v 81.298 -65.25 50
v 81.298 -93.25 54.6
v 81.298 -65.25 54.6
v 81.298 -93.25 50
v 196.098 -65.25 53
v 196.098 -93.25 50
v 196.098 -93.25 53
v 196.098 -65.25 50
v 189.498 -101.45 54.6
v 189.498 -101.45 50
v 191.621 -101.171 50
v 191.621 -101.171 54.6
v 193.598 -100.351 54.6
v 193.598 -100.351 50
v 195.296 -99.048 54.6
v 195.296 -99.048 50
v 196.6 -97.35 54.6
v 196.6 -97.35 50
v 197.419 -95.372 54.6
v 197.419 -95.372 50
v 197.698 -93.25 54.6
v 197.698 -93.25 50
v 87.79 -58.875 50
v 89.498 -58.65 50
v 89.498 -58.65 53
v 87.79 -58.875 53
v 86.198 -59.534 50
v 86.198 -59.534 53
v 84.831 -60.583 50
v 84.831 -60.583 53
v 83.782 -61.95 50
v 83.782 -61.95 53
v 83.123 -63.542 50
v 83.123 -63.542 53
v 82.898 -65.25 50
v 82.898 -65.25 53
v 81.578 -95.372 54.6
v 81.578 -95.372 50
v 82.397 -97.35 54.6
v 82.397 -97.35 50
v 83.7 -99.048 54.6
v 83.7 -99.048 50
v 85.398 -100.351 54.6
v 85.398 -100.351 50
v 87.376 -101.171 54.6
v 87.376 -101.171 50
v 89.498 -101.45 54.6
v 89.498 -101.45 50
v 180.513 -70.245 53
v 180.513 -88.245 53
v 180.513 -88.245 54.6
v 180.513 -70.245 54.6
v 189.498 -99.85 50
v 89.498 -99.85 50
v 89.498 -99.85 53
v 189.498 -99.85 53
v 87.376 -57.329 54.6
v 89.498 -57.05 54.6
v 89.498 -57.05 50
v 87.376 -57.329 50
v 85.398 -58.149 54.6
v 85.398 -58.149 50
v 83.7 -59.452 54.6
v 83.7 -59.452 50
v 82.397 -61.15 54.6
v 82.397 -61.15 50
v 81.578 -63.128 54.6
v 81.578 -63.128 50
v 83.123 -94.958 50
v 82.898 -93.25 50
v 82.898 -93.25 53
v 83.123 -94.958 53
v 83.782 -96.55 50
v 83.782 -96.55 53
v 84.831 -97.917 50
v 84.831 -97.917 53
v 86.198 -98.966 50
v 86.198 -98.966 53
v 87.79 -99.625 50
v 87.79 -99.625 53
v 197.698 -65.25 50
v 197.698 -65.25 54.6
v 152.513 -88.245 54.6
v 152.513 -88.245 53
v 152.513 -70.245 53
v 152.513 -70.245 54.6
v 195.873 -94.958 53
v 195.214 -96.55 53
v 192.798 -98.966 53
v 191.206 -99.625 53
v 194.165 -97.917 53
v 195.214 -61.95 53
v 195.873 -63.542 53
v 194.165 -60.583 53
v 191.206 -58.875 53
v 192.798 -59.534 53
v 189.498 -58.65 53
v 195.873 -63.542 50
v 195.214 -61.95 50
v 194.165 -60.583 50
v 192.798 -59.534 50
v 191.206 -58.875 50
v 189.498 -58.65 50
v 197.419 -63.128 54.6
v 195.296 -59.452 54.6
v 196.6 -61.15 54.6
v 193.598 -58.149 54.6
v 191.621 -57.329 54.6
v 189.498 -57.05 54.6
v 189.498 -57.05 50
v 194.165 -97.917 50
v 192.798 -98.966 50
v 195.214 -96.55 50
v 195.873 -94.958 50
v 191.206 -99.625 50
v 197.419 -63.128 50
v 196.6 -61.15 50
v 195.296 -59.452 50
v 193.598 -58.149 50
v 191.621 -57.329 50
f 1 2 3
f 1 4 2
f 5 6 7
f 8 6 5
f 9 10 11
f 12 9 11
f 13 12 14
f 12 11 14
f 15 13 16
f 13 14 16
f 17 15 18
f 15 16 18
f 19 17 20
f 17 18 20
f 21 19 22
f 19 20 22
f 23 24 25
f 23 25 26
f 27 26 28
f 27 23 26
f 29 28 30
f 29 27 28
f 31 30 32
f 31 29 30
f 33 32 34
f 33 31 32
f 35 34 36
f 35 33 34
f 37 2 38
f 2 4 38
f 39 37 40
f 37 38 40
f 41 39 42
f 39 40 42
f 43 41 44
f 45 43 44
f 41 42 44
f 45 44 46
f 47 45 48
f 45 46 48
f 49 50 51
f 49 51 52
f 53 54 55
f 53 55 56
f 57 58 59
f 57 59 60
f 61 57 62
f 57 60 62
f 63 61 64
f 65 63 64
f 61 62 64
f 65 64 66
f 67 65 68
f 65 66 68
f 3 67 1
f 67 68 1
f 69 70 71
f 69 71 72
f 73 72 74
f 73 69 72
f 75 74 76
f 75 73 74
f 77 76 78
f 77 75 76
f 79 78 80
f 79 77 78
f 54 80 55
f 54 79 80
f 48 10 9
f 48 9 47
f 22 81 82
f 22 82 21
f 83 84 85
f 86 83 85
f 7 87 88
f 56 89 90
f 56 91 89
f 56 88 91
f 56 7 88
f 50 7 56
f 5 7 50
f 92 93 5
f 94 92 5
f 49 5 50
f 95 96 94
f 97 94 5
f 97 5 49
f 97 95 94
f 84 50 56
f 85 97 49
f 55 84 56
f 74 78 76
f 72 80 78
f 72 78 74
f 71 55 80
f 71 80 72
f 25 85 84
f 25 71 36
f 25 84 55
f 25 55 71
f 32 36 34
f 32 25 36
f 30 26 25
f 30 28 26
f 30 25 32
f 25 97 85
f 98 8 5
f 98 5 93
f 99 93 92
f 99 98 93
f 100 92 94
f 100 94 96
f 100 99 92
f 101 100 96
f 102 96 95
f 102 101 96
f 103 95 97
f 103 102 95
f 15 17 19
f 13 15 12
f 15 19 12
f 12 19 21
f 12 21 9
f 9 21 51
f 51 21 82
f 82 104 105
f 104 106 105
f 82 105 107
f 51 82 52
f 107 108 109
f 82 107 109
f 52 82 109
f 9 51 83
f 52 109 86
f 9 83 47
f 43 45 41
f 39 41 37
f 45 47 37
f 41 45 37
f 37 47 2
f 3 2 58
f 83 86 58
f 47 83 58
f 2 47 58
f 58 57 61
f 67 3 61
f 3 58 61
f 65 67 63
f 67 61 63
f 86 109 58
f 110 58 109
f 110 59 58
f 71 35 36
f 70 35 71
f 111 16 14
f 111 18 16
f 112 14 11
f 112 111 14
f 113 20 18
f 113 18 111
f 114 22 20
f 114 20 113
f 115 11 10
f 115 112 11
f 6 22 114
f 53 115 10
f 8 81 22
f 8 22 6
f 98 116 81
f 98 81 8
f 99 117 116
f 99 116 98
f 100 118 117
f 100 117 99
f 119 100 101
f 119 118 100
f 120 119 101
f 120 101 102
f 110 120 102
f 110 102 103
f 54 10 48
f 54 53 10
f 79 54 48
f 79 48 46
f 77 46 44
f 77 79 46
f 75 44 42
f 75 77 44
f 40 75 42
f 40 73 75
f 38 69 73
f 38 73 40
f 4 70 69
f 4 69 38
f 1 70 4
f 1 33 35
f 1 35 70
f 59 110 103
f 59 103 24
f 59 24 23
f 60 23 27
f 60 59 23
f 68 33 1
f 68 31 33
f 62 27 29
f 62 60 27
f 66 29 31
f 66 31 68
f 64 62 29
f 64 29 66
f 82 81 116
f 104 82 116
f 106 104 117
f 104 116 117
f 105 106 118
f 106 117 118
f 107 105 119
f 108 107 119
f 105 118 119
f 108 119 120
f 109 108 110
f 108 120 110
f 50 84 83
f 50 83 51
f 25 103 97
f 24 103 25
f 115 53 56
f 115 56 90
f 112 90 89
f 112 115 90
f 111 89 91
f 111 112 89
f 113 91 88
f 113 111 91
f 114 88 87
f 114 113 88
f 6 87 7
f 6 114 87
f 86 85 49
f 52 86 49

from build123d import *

# Parameters (mm, degrees)
SKETCH004_W      = 28
SKETCH004_H      = 18
EXTRUDE004_DEPTH = 1.6
EXTRUDE003_DEPTH = 3


with BuildPart() as dekseltop:
    # Sketch004 → Extrude004 (new body)
    with BuildSketch(Plane.XY):
        with BuildLine():
            Line((89.498192, -57.050084), (189.498192, -57.050084))
            ThreePointArc((197.698192, -65.250084), (195.296468, -59.451808), (189.498192, -57.050084))
            Line((197.698192, -65.250084), (197.698192, -93.250084))
            ThreePointArc((189.498192, -101.450084), (195.296468, -99.04836), (197.698192, -93.250084))
            Line((189.498192, -101.450084), (89.498192, -101.450084))
            ThreePointArc((81.298192, -93.250084), (83.699916, -99.04836), (89.498192, -101.450084))
            Line((81.298192, -93.250084), (81.298192, -65.250084))
            ThreePointArc((89.498192, -57.050084), (83.699916, -59.451808), (81.298192, -65.250084))
        make_face()
        with Locations((166.513474, -79.24515)):
            Rectangle(SKETCH004_W, SKETCH004_H, mode=Mode.SUBTRACT)
    extrude(amount=EXTRUDE004_DEPTH)


with BuildPart() as dekseltop_1:
    # Extrude004 placement: moved
    add(dekseltop.part.moved(Location((0, 0, 53))))


with BuildPart() as deksel:
    # Sketch003 → Extrude003 (new body)
    with BuildSketch(Plane.XY):
        with BuildLine():
            Line((89.498192, -57.050084), (189.498192, -57.050084))
            ThreePointArc((197.698192, -65.250084), (195.296468, -59.451808), (189.498192, -57.050084))
            Line((197.698192, -65.250084), (197.698192, -93.250084))
            ThreePointArc((189.498192, -101.450084), (195.296468, -99.04836), (197.698192, -93.250084))
            Line((189.498192, -101.450084), (89.498192, -101.450084))
            ThreePointArc((81.298192, -93.250084), (83.699916, -99.04836), (89.498192, -101.450084))
            Line((81.298192, -93.250084), (81.298192, -65.250084))
            ThreePointArc((89.498192, -57.050084), (83.699916, -59.451808), (81.298192, -65.250084))
        make_face()
        with BuildLine():
            Line((89.498192, -99.850084), (189.498192, -99.850084))
            ThreePointArc((189.498192, -99.850084), (194.165097, -97.916989), (196.098192, -93.250084))
            Line((196.098192, -93.250084), (196.098192, -65.250084))
            ThreePointArc((196.098192, -65.250084), (194.165097, -60.583179), (189.498192, -58.650084))
            Line((189.498192, -58.650084), (89.498192, -58.650084))
            ThreePointArc((89.498192, -58.650084), (84.831287, -60.583179), (82.898192, -65.250084))
            Line((82.898192, -65.250084), (82.898192, -93.250084))
            ThreePointArc((82.898192, -93.250084), (84.831287, -97.916989), (89.498192, -99.850084))
        make_face(mode=Mode.SUBTRACT)
    extrude(amount=EXTRUDE003_DEPTH)


with BuildPart() as deksel_1:
    # Extrude003 placement: moved
    add(deksel.part.moved(Location((0, 0, 50))))

    # Fusion001: union DekselTop
    add(dekseltop_1.part)


solid = deksel_1.part
